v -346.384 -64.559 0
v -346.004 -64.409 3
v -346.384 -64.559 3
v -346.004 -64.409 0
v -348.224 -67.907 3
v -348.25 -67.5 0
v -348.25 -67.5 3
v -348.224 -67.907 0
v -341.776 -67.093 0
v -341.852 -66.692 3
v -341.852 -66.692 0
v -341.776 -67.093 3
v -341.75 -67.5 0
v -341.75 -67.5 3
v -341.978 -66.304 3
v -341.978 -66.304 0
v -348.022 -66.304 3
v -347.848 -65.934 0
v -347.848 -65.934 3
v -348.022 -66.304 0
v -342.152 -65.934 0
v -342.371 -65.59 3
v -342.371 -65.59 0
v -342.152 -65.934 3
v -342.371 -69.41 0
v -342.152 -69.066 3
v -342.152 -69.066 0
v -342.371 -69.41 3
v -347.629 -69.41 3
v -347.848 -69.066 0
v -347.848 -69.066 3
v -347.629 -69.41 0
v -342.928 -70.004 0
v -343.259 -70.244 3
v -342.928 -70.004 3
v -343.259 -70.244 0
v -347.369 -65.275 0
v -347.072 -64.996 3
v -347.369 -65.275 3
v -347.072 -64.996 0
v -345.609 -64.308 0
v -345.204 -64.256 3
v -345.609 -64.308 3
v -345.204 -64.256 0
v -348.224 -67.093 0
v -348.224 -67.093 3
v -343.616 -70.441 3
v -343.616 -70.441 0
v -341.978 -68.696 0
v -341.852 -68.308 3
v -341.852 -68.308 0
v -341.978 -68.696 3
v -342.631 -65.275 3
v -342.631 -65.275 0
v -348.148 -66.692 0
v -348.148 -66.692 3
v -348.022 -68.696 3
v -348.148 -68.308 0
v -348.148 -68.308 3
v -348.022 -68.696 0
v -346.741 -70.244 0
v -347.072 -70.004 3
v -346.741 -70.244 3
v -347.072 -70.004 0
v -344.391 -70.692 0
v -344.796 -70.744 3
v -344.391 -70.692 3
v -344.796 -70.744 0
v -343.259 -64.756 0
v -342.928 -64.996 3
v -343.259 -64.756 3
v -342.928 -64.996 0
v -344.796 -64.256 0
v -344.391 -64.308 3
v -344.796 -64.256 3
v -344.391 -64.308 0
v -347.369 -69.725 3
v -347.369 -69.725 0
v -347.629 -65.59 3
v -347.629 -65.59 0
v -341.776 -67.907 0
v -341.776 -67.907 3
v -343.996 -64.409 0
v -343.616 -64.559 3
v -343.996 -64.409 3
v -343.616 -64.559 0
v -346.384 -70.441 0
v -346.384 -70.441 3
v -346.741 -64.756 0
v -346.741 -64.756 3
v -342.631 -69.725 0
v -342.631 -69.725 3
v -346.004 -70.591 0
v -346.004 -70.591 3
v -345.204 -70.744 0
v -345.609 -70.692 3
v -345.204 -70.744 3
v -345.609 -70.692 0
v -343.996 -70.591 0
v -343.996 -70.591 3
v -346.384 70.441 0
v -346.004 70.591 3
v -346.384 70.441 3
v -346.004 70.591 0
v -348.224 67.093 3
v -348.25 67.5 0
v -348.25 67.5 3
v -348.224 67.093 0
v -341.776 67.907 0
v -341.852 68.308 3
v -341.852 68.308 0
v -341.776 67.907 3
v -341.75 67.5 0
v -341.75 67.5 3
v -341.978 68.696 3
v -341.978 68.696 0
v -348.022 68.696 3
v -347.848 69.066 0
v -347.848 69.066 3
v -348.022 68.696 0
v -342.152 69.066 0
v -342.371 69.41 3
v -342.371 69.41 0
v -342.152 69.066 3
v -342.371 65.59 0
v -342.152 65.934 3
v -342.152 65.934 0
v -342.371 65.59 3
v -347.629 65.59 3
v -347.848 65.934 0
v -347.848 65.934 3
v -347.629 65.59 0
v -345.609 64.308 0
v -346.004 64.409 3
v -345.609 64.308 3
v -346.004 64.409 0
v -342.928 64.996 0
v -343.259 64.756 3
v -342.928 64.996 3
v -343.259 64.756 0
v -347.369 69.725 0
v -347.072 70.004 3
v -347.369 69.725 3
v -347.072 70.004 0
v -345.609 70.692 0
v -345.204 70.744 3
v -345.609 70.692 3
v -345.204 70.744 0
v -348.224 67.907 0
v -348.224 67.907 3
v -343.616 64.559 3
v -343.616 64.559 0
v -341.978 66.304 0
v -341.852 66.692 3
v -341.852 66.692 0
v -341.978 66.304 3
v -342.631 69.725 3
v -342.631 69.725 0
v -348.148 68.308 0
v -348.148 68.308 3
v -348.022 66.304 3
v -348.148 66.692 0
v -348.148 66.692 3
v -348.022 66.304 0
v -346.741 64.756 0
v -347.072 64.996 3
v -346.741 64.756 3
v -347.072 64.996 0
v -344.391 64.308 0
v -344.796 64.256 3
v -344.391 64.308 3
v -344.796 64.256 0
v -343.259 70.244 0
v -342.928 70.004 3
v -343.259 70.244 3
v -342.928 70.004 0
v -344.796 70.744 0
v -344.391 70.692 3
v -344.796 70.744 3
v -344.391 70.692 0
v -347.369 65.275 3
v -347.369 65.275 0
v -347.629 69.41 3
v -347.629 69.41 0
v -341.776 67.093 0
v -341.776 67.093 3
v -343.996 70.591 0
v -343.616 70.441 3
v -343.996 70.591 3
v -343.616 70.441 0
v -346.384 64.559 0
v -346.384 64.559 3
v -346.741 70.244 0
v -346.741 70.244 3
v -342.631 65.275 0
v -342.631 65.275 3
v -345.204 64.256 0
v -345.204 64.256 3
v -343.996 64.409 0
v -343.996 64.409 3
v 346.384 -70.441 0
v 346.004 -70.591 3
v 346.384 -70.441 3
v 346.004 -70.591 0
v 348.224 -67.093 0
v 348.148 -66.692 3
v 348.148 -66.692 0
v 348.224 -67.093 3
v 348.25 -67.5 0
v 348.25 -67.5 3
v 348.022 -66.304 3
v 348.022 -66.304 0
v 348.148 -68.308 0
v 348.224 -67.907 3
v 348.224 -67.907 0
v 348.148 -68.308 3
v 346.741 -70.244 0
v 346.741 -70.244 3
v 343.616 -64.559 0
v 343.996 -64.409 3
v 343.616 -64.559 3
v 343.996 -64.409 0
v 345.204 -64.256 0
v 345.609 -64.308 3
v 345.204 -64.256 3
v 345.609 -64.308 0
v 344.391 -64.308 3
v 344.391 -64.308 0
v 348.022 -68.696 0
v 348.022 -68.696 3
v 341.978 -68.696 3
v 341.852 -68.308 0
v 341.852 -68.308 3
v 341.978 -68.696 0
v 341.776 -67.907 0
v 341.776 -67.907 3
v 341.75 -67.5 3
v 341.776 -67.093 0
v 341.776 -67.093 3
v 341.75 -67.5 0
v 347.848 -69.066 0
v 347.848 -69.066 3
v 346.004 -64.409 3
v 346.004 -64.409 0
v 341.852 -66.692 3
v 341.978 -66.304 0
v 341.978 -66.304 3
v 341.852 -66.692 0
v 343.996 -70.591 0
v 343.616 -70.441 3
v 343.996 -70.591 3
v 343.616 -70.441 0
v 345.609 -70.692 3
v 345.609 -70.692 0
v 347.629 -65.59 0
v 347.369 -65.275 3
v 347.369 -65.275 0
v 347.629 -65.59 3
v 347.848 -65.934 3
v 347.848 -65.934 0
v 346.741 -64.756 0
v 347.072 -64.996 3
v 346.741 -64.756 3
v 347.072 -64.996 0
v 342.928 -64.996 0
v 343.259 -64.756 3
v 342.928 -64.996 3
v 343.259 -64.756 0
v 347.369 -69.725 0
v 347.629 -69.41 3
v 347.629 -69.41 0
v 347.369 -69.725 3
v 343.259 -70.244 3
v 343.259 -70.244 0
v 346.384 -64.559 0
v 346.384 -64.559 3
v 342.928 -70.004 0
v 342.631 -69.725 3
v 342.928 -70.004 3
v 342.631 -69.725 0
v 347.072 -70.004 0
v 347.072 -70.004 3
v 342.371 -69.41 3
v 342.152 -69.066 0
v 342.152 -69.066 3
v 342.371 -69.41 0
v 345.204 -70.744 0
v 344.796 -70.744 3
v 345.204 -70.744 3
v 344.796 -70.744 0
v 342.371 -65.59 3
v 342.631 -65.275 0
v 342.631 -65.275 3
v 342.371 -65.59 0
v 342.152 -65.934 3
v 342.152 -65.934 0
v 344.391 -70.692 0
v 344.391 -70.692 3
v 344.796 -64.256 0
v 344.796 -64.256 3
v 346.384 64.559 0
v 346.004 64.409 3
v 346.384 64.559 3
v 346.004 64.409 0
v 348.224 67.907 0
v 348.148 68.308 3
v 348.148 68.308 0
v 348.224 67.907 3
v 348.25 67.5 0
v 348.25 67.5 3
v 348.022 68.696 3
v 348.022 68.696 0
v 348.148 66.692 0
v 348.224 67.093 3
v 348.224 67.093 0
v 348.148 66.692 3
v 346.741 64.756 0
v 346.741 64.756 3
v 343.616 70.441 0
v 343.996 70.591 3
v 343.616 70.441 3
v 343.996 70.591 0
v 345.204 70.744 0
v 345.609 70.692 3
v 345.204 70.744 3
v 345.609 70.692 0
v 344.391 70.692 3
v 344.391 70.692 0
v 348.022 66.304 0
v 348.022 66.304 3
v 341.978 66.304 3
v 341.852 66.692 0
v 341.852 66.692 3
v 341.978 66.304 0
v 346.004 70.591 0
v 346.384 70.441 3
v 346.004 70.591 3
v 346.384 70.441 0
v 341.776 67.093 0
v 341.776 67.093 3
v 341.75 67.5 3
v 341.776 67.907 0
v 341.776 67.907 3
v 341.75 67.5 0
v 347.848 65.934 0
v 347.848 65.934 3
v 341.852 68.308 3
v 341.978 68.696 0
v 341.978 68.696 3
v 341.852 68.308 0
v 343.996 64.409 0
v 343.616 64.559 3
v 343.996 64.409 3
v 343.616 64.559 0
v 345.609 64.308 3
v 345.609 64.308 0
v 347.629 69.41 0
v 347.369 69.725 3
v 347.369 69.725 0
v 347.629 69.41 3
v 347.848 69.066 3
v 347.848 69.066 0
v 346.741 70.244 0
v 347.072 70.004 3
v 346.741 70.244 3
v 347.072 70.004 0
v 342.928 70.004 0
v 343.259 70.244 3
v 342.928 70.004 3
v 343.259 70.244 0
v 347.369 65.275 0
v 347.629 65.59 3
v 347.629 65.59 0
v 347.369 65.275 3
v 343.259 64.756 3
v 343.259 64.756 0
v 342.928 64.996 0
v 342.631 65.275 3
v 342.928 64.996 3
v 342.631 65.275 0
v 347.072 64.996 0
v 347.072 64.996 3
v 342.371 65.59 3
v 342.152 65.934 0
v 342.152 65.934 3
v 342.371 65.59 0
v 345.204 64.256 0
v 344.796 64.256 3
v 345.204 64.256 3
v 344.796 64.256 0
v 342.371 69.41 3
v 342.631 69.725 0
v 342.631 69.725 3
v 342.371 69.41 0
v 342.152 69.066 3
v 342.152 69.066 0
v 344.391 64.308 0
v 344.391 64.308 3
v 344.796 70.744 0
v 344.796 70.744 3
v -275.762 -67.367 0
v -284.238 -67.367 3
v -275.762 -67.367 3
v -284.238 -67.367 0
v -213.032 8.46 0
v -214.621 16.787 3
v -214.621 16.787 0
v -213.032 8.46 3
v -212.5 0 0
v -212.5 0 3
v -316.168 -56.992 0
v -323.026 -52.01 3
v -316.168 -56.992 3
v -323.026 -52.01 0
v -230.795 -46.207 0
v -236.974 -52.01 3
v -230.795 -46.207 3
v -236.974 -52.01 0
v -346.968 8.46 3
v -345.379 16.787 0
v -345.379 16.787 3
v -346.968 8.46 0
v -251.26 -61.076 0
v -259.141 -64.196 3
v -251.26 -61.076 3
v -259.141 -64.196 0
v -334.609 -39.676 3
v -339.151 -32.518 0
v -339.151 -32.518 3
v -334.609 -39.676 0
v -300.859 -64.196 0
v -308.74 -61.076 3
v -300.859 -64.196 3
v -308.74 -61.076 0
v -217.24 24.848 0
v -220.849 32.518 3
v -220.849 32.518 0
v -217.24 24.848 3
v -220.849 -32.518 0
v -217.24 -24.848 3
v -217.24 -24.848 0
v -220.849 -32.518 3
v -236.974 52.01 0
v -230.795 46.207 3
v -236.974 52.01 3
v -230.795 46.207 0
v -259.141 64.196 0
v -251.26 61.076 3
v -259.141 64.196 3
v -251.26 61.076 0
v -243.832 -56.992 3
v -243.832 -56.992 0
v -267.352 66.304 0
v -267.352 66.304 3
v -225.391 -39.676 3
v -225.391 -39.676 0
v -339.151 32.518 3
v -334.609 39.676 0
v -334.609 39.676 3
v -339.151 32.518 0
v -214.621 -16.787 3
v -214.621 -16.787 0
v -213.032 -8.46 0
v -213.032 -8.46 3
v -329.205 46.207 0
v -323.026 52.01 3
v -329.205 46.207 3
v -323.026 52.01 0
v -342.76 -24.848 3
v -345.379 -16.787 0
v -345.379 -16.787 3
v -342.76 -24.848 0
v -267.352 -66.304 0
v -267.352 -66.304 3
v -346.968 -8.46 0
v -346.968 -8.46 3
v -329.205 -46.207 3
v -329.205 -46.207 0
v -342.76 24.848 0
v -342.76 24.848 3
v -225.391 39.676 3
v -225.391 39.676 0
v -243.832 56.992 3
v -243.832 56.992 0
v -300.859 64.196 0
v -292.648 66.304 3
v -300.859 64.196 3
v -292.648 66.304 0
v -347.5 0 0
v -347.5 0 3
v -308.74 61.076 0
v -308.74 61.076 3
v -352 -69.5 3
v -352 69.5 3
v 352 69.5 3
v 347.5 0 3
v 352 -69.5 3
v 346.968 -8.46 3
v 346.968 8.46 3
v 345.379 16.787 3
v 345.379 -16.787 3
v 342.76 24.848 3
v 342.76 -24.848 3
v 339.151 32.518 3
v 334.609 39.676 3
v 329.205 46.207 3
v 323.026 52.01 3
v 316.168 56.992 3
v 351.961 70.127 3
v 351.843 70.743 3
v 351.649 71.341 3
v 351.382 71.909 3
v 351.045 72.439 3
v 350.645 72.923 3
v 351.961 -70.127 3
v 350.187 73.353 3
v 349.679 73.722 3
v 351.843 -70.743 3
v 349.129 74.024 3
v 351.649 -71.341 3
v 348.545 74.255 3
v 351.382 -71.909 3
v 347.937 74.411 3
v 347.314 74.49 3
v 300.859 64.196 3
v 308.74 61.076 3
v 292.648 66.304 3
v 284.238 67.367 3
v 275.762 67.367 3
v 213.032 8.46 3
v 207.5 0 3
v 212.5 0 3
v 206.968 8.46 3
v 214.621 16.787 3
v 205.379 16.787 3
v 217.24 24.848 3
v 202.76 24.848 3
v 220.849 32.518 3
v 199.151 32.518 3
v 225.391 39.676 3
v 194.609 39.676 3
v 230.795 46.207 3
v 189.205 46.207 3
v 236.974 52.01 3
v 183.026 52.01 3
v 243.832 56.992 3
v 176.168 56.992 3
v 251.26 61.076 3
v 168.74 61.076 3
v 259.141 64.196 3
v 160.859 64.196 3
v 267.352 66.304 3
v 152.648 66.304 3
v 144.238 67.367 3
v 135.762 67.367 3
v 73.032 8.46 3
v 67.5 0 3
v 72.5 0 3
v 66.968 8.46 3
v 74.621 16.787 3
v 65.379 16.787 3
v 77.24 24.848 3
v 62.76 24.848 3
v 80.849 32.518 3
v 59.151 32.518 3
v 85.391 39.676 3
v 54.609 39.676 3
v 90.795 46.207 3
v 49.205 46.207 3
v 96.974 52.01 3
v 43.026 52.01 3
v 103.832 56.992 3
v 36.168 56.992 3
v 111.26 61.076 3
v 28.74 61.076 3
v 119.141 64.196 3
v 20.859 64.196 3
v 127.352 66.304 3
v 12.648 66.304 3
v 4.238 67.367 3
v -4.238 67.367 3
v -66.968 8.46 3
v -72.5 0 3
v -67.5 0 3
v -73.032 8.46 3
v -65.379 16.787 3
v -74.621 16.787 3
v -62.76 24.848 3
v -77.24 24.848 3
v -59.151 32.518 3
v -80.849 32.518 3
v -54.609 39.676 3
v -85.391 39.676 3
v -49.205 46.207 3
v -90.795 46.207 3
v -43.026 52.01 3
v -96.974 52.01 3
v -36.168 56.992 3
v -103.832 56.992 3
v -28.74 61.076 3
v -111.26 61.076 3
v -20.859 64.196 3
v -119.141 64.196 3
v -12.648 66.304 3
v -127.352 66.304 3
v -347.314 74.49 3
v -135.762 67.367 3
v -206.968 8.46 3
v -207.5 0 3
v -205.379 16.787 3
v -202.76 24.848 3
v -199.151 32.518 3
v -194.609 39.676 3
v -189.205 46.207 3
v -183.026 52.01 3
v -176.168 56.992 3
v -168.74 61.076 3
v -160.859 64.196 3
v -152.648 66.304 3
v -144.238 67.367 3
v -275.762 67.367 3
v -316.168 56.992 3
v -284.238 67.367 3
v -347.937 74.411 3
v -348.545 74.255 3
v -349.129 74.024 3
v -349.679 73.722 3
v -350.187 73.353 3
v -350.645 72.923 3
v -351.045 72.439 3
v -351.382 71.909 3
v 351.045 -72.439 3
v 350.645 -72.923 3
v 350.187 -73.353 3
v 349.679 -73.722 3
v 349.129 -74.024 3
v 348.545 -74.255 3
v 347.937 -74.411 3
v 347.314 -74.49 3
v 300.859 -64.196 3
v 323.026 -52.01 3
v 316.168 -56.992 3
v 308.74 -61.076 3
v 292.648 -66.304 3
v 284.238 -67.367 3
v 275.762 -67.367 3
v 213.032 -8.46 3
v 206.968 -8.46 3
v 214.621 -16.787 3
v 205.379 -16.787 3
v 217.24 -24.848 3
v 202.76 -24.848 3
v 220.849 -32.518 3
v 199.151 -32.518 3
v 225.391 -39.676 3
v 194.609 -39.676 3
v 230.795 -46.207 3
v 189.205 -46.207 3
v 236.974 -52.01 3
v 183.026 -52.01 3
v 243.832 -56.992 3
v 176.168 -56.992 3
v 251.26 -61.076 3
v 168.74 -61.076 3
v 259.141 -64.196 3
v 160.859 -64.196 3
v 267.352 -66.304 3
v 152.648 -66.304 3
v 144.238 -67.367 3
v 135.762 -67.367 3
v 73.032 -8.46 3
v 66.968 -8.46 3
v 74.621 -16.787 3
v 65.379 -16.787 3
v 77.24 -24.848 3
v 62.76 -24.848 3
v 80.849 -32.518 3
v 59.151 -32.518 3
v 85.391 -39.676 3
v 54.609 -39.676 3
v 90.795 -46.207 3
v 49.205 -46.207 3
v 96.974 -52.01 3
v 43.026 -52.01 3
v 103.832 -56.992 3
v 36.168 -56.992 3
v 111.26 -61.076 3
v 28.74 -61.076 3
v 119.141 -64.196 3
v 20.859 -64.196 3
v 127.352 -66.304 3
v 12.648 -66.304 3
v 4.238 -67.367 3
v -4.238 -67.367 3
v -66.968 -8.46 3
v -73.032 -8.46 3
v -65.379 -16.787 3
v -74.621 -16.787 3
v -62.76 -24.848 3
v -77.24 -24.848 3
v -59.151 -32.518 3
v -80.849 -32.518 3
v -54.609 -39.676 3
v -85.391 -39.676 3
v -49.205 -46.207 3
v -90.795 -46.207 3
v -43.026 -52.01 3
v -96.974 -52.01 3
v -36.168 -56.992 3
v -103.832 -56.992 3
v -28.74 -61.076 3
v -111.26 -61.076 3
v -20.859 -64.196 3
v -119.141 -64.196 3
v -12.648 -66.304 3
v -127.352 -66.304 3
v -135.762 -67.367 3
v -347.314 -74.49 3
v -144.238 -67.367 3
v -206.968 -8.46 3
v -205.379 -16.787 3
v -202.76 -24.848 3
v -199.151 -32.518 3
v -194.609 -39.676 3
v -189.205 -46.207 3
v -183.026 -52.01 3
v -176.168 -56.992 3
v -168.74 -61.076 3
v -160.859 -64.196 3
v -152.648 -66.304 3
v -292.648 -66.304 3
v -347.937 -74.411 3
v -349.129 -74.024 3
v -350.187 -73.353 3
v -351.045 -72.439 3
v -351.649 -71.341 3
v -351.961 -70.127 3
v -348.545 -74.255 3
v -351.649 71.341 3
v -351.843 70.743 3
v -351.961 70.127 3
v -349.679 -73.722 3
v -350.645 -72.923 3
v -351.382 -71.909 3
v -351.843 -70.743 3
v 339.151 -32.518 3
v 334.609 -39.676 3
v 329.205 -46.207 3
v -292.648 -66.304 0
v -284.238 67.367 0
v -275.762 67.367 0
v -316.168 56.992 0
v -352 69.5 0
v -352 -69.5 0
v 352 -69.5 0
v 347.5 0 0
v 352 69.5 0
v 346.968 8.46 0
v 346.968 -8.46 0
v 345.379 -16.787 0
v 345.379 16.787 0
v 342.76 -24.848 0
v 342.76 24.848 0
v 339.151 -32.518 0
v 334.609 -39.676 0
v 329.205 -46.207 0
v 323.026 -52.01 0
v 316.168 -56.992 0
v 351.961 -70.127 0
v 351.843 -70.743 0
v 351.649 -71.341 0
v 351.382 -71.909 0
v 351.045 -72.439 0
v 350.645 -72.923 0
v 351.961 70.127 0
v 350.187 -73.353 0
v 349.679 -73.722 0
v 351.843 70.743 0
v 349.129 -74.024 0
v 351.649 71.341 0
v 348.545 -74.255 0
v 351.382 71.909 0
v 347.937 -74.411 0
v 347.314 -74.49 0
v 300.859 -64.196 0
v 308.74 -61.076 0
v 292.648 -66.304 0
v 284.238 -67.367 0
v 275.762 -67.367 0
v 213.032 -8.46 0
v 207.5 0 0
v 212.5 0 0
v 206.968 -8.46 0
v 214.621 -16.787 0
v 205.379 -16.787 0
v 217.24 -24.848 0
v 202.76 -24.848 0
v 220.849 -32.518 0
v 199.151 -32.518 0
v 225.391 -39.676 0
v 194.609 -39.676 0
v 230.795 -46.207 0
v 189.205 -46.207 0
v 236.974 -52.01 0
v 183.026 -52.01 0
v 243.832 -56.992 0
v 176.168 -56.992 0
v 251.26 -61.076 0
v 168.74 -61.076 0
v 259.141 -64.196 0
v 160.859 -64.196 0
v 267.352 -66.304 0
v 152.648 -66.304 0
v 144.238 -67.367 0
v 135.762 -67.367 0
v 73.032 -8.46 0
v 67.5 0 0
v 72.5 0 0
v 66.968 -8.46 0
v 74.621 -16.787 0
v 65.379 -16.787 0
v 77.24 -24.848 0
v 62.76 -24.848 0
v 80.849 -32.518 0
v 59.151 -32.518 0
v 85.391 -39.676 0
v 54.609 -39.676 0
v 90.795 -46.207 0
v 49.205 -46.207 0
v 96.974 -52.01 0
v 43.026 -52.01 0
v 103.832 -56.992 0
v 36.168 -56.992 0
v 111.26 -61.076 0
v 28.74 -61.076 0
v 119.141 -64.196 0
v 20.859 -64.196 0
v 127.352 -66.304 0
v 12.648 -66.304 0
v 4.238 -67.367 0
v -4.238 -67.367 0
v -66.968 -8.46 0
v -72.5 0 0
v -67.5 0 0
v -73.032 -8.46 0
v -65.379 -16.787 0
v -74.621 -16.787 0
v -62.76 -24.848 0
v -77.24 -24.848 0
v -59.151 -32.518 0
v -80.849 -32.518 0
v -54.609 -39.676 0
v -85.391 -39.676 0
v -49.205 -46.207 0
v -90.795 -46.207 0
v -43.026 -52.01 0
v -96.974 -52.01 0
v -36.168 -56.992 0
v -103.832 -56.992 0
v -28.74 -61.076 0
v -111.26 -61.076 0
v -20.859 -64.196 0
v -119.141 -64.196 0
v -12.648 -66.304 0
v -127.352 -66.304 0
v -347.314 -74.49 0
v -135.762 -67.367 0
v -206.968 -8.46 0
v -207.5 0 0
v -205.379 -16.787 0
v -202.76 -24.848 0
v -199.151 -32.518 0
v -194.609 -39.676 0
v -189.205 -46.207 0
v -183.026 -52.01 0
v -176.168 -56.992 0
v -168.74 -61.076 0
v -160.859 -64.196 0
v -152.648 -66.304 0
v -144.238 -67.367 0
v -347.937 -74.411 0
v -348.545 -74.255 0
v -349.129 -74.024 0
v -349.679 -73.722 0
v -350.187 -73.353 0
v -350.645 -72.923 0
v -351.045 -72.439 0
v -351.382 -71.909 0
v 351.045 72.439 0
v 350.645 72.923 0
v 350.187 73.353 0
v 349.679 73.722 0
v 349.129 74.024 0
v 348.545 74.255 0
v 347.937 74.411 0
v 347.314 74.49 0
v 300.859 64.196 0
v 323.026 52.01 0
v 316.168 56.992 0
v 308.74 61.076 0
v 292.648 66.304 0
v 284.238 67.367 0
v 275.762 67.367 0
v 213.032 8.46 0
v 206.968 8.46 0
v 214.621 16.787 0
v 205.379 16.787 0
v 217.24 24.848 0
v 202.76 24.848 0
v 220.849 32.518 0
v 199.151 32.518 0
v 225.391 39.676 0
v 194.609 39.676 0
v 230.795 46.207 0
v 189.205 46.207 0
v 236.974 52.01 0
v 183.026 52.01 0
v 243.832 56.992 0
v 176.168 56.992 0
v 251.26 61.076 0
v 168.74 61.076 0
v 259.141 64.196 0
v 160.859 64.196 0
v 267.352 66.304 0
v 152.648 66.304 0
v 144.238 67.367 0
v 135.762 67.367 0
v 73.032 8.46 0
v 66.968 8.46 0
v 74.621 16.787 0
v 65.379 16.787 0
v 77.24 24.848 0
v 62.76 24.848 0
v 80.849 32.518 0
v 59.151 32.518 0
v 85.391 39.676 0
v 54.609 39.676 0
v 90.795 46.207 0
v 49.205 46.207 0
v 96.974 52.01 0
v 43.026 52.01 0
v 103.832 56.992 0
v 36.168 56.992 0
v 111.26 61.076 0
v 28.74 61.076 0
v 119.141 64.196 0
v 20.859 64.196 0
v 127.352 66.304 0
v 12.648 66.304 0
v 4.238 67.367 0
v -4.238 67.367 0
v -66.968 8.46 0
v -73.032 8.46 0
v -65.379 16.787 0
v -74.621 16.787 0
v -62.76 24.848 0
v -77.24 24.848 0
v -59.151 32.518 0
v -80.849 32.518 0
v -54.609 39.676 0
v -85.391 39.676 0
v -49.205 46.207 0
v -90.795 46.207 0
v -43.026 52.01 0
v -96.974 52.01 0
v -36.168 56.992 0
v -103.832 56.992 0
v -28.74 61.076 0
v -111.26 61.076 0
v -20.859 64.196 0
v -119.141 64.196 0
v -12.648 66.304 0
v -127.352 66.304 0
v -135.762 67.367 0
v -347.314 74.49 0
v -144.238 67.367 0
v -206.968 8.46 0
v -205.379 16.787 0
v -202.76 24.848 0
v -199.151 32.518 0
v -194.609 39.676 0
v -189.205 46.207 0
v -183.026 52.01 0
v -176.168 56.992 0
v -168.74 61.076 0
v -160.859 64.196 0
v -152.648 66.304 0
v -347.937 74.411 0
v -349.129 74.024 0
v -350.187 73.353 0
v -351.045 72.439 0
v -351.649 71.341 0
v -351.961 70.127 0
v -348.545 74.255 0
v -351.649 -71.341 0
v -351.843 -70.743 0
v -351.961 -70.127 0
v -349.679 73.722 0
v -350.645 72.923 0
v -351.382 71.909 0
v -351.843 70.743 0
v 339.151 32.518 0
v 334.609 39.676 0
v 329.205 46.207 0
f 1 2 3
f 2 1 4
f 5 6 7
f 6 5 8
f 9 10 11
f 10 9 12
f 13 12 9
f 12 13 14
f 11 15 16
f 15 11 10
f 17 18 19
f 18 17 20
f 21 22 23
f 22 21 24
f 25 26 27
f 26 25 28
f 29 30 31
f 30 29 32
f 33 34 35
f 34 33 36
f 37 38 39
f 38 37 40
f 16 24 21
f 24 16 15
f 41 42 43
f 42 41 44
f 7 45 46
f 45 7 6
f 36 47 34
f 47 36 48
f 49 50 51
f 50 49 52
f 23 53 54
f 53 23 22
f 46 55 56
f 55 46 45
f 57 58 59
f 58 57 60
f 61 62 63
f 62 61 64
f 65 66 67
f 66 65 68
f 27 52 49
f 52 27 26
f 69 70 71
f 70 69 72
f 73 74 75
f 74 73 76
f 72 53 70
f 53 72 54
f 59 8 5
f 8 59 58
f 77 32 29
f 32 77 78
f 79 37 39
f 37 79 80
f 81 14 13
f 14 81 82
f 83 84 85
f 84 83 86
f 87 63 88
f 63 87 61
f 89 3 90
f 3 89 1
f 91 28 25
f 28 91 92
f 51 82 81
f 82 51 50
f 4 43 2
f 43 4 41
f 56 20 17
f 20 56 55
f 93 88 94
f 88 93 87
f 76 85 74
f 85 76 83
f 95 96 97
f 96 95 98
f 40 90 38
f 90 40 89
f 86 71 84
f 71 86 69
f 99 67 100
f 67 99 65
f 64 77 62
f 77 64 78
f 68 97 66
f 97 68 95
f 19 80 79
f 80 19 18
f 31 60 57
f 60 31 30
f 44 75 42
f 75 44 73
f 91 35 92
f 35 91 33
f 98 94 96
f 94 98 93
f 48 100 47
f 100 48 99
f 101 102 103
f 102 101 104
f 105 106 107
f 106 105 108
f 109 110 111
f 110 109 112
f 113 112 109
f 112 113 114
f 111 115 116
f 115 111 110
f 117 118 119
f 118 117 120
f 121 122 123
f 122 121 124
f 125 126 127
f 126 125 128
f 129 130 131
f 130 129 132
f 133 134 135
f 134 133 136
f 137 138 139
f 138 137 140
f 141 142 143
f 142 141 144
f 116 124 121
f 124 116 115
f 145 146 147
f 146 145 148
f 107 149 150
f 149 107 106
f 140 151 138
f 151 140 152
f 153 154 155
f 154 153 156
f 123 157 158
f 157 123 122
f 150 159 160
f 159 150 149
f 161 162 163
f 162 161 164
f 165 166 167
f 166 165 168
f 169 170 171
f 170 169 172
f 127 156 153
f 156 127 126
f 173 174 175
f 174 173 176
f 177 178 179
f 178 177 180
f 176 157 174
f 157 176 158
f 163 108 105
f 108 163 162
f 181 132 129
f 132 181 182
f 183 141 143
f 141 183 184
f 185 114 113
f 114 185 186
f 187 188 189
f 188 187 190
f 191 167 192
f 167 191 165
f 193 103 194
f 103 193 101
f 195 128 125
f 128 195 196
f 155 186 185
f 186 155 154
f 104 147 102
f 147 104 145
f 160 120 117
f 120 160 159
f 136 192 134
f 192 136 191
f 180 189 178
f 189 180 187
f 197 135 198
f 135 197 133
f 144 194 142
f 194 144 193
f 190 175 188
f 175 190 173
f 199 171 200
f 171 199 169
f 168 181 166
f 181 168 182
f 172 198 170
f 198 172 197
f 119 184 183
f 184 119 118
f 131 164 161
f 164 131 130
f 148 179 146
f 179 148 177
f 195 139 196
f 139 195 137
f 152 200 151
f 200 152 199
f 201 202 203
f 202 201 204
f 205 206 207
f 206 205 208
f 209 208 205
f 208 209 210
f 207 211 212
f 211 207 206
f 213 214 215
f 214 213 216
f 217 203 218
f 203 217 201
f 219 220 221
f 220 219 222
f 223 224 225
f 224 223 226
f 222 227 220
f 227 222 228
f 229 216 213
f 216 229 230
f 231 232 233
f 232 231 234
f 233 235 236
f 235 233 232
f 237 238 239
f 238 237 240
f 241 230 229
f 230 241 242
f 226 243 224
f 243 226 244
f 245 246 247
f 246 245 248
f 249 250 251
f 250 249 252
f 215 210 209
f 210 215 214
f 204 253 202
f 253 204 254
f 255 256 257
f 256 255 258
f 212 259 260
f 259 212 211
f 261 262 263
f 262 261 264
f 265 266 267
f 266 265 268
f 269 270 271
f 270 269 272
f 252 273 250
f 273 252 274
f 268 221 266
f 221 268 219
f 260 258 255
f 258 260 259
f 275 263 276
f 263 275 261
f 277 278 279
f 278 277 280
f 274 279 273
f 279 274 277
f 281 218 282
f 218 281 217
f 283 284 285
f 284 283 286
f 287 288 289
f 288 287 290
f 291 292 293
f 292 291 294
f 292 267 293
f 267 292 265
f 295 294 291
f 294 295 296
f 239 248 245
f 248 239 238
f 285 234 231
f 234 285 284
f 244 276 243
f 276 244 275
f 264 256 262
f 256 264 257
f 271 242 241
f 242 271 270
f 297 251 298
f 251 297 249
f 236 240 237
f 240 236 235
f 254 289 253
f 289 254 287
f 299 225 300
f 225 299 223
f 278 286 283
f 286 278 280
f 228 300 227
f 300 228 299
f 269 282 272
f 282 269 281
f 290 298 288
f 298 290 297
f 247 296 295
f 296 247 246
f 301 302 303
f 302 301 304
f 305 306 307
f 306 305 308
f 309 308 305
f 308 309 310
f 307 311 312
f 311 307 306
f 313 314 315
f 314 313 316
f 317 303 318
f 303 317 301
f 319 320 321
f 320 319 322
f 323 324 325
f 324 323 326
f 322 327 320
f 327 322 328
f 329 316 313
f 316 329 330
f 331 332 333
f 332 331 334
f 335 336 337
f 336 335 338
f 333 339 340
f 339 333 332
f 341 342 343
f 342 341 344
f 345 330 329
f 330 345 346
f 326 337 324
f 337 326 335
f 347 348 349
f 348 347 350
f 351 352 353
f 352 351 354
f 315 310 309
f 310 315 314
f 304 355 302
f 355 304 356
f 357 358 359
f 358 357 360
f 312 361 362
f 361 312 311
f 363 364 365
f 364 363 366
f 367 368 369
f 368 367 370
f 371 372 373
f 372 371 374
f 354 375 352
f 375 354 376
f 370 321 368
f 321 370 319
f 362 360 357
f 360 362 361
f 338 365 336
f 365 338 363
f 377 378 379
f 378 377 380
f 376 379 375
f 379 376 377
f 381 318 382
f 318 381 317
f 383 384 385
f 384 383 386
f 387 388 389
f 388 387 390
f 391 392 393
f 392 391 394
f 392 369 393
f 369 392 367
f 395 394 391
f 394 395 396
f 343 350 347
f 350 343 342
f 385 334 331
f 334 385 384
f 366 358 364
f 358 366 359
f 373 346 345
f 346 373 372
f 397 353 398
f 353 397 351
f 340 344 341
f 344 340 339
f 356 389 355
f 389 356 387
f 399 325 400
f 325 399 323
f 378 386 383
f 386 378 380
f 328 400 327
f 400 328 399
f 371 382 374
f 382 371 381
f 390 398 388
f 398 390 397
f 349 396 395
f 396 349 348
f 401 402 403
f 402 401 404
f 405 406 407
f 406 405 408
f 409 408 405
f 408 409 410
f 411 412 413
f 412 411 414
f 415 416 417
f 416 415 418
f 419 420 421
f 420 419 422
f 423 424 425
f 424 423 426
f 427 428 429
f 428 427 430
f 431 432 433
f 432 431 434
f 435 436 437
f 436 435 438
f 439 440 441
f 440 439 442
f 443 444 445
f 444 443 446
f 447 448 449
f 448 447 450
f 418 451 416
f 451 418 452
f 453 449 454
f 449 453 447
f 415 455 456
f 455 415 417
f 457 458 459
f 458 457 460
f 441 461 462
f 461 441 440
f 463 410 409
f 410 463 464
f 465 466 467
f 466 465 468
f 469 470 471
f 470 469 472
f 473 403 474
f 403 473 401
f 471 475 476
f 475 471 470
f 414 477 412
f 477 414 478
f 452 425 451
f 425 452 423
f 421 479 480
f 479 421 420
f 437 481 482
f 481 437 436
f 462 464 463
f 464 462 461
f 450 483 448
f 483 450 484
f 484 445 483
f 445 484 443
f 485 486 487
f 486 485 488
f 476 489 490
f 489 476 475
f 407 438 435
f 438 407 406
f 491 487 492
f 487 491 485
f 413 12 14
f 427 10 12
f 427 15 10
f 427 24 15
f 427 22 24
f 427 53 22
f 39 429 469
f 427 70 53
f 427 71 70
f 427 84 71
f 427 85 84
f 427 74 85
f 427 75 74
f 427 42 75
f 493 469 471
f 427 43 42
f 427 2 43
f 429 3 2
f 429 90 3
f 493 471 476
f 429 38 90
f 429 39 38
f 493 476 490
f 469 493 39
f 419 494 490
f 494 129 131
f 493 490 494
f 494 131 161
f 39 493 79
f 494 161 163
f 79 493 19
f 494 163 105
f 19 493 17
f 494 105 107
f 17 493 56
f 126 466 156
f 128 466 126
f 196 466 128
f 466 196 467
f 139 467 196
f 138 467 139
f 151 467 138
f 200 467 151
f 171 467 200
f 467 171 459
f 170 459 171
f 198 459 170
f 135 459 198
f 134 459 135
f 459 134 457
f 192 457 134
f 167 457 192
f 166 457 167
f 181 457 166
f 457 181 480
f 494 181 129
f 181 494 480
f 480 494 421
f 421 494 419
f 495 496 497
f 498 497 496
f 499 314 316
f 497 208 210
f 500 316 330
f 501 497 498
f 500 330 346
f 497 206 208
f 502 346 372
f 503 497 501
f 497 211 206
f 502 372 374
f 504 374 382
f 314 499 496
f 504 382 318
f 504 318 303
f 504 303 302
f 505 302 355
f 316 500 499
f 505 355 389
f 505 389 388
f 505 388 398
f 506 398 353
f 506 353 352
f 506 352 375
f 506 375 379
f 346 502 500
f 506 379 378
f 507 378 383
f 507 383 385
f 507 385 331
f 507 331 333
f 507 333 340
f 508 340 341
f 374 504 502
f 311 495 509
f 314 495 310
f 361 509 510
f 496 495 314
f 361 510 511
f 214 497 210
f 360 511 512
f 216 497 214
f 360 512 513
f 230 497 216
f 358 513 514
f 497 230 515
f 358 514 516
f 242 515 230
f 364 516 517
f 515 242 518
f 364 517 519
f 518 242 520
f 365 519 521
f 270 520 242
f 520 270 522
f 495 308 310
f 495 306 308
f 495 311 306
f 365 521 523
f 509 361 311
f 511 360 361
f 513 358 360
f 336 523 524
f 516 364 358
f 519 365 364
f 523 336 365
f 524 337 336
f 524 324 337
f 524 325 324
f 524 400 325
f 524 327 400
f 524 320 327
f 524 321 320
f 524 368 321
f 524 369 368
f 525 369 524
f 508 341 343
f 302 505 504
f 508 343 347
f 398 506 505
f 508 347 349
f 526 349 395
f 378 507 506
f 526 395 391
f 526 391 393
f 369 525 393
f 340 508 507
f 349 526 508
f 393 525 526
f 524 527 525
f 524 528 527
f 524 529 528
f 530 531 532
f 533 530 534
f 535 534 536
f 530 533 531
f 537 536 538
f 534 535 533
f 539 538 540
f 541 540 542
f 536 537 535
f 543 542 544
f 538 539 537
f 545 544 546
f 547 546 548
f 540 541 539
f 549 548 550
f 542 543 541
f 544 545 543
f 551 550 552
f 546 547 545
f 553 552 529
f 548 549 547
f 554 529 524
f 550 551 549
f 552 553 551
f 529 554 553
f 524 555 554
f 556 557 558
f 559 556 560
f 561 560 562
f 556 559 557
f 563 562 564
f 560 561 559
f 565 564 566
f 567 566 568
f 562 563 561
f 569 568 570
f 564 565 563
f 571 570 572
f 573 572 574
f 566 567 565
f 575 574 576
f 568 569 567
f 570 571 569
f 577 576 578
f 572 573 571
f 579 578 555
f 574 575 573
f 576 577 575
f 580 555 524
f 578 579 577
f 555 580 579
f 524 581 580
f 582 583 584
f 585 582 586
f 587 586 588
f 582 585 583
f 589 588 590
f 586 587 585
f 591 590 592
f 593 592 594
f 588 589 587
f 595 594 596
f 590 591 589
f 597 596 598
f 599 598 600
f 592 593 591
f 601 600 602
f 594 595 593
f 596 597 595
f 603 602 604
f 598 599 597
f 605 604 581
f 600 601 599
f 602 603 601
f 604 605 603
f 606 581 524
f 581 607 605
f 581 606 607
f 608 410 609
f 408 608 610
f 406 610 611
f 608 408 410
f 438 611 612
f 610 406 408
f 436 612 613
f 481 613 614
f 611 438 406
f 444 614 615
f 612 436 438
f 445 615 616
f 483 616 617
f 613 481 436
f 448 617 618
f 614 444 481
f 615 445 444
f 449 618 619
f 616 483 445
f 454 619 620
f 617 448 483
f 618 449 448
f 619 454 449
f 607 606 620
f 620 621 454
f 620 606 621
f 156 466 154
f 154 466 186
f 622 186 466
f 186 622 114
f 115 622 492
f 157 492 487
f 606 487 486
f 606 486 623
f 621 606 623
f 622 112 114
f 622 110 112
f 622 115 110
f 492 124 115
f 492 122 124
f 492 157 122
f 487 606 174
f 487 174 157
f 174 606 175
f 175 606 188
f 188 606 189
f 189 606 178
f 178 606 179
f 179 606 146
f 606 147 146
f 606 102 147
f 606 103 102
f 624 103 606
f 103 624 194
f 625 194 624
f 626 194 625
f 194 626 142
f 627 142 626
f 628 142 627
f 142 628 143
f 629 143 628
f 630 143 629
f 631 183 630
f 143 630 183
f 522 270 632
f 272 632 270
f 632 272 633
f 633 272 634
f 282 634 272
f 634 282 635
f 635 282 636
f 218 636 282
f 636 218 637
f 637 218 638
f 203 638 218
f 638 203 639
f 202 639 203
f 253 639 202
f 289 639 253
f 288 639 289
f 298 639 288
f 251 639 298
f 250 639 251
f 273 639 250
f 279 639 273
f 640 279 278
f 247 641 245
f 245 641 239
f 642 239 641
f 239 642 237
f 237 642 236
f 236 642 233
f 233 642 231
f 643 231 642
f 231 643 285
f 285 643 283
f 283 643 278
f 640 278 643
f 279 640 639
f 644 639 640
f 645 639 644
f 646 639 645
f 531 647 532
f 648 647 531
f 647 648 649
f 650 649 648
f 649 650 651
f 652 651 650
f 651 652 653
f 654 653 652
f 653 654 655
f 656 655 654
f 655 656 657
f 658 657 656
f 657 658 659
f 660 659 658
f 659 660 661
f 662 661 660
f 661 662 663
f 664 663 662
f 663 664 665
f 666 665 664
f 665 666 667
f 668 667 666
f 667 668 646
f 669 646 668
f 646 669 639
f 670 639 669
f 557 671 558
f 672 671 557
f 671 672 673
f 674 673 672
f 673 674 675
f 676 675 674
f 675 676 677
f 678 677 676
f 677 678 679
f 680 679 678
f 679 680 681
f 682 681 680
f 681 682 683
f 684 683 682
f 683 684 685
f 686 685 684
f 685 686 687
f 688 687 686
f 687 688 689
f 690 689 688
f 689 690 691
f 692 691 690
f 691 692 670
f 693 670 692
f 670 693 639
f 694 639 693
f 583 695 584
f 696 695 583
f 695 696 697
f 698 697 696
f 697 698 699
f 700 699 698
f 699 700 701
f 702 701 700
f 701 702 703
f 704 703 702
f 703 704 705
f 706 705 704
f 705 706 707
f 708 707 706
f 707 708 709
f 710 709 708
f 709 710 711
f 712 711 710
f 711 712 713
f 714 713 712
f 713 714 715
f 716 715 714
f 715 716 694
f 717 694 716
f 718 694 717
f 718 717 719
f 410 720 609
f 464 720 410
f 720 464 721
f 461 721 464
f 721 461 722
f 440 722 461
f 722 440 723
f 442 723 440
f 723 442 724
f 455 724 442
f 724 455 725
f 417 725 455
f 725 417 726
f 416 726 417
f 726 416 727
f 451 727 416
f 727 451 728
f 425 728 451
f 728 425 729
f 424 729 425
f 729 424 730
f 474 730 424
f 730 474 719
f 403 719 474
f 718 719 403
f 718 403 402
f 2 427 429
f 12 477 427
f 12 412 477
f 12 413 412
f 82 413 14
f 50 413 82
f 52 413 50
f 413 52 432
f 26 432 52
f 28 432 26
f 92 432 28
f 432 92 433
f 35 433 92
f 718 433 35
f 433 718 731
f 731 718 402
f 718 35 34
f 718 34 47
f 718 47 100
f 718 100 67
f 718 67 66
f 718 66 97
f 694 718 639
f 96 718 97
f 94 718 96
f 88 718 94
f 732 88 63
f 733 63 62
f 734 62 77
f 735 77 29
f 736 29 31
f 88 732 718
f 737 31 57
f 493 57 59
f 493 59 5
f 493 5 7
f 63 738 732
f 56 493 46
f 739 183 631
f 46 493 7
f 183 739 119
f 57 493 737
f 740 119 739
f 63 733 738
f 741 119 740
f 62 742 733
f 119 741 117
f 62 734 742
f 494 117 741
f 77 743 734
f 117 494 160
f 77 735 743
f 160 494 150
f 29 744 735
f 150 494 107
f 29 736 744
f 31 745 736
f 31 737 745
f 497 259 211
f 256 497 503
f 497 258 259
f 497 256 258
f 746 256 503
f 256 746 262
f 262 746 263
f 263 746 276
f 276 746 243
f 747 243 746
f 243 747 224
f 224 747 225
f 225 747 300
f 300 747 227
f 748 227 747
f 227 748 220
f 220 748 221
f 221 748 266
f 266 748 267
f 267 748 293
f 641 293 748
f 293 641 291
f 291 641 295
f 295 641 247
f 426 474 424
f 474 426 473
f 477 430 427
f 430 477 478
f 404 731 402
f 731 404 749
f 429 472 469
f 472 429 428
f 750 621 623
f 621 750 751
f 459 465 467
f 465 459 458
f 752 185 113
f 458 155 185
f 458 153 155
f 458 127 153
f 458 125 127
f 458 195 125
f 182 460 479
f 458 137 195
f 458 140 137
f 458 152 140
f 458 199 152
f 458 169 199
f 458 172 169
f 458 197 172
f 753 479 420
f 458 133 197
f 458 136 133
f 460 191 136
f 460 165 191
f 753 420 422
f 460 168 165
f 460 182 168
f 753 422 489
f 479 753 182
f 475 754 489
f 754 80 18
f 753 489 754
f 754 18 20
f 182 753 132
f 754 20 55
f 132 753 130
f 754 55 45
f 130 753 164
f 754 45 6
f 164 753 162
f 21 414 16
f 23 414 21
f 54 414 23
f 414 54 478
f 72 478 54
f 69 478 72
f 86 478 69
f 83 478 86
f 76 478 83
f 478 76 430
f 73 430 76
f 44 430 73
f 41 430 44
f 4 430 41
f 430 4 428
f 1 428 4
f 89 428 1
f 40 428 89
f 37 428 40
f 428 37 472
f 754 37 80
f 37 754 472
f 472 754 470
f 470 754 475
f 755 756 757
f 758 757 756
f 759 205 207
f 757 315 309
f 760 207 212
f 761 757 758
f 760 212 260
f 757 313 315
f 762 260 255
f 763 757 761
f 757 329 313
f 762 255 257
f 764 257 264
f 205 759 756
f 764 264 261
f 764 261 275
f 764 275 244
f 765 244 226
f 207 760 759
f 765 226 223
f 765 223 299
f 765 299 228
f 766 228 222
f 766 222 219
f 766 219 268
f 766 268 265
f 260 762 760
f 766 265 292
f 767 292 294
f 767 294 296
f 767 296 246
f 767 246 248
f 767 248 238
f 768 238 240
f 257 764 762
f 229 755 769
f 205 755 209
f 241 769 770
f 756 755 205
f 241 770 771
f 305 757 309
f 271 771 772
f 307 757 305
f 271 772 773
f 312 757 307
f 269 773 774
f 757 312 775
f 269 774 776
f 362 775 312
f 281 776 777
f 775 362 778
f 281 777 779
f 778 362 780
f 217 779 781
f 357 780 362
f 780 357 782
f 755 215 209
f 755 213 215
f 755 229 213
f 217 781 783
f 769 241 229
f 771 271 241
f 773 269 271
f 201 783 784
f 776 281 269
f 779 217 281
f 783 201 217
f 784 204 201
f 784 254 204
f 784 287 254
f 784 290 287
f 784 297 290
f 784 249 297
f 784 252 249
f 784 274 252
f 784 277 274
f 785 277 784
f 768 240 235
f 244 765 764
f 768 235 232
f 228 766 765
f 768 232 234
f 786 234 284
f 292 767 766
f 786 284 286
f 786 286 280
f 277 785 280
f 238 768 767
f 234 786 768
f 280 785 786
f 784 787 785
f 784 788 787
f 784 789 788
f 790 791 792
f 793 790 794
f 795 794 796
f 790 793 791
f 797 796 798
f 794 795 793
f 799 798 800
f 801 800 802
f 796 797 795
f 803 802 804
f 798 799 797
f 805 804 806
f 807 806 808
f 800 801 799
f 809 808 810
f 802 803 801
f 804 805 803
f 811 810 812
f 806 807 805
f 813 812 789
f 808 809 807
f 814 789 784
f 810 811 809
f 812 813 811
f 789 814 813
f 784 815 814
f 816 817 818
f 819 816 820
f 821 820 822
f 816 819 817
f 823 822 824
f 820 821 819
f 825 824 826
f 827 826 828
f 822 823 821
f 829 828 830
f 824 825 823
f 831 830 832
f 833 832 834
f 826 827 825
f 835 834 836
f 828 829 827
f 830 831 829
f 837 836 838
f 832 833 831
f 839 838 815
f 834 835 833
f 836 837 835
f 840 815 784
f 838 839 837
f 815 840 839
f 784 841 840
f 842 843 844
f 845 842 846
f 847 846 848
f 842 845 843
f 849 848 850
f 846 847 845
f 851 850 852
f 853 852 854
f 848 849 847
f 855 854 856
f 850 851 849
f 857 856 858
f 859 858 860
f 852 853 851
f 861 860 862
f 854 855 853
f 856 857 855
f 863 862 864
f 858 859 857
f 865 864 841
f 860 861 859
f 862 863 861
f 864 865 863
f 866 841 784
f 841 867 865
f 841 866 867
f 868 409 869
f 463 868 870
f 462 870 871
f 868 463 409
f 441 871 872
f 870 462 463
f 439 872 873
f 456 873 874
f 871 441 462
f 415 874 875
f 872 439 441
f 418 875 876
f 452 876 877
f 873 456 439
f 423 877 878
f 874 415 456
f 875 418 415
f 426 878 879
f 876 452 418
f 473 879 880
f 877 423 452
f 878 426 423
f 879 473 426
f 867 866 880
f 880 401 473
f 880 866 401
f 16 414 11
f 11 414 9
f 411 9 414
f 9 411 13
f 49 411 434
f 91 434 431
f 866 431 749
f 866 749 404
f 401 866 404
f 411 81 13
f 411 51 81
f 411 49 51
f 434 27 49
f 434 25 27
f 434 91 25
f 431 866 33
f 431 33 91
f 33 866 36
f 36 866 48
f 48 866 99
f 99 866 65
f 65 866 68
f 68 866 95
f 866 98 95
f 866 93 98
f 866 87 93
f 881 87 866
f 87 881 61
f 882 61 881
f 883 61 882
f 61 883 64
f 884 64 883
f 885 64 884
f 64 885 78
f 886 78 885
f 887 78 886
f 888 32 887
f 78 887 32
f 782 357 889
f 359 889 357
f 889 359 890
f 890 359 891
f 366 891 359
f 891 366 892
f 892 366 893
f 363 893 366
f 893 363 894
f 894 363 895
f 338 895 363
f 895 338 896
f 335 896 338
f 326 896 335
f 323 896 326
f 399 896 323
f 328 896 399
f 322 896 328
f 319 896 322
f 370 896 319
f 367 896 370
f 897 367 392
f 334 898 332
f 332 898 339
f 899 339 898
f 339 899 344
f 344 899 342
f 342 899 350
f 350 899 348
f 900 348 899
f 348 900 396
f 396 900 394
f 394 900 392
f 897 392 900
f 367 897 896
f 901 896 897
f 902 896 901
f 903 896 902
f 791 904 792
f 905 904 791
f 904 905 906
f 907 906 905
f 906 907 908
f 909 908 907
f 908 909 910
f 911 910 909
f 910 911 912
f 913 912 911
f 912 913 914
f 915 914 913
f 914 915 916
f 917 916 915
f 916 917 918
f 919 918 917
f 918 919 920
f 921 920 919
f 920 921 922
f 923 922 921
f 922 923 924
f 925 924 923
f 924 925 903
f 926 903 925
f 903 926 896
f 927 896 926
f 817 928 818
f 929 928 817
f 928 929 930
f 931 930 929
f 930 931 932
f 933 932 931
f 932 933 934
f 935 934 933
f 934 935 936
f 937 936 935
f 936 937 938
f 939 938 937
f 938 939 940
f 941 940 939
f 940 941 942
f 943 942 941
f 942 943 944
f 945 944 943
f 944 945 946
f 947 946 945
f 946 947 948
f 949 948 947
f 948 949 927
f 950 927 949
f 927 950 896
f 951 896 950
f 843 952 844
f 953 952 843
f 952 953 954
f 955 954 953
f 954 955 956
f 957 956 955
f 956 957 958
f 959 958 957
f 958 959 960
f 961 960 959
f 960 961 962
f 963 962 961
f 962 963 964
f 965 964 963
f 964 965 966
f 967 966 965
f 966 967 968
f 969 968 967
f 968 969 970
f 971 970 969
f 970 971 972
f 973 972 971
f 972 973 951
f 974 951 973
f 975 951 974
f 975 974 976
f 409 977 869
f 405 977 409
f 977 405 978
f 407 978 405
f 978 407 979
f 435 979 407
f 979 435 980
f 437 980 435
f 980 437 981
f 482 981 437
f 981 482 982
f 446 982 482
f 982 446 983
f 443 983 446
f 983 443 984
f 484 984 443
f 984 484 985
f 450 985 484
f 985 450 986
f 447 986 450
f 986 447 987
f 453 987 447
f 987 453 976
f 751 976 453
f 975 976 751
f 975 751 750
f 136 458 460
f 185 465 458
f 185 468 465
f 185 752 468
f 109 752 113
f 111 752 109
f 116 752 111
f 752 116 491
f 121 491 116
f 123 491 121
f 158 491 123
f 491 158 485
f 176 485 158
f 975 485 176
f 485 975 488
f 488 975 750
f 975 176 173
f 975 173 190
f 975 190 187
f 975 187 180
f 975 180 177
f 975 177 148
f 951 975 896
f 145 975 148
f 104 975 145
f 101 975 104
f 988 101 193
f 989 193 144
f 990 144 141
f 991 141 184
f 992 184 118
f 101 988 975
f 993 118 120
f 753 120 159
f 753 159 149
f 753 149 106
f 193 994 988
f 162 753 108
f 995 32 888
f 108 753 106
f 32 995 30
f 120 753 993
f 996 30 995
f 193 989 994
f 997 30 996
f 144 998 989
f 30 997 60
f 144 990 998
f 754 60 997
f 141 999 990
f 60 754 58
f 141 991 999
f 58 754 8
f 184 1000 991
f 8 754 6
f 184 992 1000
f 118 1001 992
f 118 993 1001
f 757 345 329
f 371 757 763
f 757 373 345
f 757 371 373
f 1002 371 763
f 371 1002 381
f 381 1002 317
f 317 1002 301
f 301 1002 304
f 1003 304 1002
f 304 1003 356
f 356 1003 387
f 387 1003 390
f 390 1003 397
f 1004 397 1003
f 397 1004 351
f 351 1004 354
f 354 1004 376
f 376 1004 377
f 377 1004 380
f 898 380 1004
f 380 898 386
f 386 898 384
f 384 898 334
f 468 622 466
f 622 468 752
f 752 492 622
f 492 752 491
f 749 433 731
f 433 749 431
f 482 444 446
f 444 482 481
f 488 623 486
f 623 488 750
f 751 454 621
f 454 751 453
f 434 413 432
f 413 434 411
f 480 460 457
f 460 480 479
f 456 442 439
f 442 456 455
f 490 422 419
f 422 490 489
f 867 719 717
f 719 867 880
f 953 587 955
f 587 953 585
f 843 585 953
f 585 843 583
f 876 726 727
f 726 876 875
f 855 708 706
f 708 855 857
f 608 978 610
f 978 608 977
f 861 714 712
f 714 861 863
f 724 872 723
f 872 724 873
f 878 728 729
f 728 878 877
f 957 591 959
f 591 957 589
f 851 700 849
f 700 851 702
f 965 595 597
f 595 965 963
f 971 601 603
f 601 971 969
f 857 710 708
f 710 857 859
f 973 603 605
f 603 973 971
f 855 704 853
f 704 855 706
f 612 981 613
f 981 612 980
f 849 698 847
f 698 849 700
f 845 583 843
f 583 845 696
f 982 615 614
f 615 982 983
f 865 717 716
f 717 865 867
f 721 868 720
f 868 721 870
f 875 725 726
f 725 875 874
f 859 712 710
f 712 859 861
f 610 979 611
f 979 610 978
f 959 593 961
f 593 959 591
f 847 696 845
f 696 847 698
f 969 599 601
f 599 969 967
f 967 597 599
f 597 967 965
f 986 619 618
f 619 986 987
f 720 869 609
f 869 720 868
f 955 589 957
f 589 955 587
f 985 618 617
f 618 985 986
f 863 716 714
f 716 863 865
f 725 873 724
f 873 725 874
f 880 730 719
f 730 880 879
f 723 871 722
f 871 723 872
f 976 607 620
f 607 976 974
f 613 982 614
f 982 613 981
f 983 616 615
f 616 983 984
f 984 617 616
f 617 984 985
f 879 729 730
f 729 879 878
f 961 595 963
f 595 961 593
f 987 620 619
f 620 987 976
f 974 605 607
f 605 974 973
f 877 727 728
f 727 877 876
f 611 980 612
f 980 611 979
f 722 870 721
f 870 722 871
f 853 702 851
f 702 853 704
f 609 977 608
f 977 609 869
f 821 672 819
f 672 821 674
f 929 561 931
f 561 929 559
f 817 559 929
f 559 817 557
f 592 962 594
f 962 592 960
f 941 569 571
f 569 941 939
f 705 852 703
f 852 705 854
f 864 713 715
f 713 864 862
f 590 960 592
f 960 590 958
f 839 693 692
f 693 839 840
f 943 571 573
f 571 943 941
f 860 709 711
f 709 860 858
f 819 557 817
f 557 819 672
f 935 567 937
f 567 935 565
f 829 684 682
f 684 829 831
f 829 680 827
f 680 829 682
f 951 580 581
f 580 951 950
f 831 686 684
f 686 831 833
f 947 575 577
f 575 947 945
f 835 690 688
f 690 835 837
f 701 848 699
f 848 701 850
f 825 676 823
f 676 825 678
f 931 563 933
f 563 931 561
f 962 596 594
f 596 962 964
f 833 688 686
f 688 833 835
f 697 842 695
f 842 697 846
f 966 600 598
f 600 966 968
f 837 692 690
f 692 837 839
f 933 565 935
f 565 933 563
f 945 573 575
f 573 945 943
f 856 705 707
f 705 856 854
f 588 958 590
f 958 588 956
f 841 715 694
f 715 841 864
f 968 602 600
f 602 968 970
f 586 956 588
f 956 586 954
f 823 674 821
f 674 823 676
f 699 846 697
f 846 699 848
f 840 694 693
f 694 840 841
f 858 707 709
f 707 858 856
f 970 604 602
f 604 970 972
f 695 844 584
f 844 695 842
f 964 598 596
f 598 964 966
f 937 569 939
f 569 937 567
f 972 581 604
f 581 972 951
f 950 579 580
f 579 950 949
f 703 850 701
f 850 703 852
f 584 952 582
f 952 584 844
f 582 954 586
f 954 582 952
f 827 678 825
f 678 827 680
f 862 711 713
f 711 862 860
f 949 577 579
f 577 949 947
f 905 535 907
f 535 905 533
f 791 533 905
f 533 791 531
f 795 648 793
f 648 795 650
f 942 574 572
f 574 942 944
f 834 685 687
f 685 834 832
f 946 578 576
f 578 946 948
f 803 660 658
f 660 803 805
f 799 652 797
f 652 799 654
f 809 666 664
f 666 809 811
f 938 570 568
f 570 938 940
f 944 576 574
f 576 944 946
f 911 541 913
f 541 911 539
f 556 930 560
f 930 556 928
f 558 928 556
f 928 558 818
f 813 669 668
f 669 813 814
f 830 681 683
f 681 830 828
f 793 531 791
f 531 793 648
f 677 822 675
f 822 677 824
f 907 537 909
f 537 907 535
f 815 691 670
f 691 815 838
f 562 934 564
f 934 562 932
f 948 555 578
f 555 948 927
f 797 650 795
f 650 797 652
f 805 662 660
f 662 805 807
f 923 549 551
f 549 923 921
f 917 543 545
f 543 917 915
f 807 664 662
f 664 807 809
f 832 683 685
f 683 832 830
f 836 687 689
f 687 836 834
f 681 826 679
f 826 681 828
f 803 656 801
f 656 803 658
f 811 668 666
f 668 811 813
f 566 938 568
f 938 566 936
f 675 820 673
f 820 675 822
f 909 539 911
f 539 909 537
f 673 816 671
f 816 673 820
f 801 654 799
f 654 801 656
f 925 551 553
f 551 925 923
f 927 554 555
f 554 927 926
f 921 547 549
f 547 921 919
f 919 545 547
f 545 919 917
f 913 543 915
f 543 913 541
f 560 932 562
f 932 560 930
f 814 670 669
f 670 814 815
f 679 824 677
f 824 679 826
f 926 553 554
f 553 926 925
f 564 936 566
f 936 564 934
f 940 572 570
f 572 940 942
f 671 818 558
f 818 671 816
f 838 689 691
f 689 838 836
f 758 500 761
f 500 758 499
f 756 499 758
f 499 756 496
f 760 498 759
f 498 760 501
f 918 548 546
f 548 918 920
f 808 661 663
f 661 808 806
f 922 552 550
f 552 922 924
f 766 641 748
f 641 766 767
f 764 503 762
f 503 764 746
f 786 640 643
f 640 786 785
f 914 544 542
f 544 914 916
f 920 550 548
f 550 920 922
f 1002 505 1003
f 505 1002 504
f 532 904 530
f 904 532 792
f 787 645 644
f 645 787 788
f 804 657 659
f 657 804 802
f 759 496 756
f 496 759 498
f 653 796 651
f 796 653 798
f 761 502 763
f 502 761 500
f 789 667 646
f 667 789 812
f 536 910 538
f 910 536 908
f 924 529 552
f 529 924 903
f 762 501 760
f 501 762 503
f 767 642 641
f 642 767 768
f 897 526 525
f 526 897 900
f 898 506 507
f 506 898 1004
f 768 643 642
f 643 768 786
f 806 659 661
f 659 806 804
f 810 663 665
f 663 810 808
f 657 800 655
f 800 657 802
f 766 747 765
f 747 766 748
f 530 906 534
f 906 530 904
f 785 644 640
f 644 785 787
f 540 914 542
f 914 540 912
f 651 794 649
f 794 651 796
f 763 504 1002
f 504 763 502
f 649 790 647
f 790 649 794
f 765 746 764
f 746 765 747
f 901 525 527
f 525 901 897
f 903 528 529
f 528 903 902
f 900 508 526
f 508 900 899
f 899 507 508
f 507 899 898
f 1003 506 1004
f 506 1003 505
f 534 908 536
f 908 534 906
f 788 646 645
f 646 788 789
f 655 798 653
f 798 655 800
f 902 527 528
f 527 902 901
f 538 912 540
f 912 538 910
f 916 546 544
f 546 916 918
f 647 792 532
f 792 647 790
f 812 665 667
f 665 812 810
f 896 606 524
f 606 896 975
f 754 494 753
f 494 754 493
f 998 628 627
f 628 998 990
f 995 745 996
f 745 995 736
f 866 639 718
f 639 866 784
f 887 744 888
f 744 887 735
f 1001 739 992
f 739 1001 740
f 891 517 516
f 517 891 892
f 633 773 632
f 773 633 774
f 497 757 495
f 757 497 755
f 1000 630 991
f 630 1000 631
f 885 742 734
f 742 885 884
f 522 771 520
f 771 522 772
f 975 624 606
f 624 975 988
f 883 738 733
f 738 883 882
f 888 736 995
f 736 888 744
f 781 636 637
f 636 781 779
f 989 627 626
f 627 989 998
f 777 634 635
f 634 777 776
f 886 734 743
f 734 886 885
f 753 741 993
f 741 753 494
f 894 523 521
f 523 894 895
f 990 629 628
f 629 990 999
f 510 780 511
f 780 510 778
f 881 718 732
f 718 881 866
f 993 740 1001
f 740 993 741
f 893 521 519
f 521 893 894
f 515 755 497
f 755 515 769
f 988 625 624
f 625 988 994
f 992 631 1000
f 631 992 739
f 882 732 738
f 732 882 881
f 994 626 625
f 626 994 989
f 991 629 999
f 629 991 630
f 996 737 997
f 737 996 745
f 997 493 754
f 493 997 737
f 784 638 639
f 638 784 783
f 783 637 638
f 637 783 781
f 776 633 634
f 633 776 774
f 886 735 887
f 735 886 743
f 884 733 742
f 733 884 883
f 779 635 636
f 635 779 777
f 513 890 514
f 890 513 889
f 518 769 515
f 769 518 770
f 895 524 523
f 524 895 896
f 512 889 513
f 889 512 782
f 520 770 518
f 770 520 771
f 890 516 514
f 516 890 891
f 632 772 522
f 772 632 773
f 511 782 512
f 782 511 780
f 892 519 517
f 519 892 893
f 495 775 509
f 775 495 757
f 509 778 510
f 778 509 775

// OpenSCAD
$fn = 50;


difference() {
	union() {
		hull() {
			translate(v = [-347.0000000000, 69.5000000000, 0]) {
				cylinder(h = 3, r = 5);
			}
			translate(v = [347.0000000000, 69.5000000000, 0]) {
				cylinder(h = 3, r = 5);
			}
			translate(v = [-347.0000000000, -69.5000000000, 0]) {
				cylinder(h = 3, r = 5);
			}
			translate(v = [347.0000000000, -69.5000000000, 0]) {
				cylinder(h = 3, r = 5);
			}
		}
	}
	union() {
		#translate(v = [-345.0000000000, -67.5000000000, -100.0000000000]) {
			cylinder(h = 200, r = 3.2500000000);
		}
		#translate(v = [-345.0000000000, 67.5000000000, -100.0000000000]) {
			cylinder(h = 200, r = 3.2500000000);
		}
		#translate(v = [345.0000000000, -67.5000000000, -100.0000000000]) {
			cylinder(h = 200, r = 3.2500000000);
		}
		#translate(v = [345.0000000000, 67.5000000000, -100.0000000000]) {
			cylinder(h = 200, r = 3.2500000000);
		}
		#translate(v = [-280.0000000000, 0, 0]) {
			cylinder(h = 3, r = 67.5000000000);
		}
		#translate(v = [-140.0000000000, 0, 0]) {
			cylinder(h = 3, r = 67.5000000000);
		}
		#cylinder(h = 3, r = 67.5000000000);
		#translate(v = [140.0000000000, 0, 0]) {
			cylinder(h = 3, r = 67.5000000000);
		}
		#translate(v = [280.0000000000, 0, 0]) {
			cylinder(h = 3, r = 67.5000000000);
		}
	}
}
